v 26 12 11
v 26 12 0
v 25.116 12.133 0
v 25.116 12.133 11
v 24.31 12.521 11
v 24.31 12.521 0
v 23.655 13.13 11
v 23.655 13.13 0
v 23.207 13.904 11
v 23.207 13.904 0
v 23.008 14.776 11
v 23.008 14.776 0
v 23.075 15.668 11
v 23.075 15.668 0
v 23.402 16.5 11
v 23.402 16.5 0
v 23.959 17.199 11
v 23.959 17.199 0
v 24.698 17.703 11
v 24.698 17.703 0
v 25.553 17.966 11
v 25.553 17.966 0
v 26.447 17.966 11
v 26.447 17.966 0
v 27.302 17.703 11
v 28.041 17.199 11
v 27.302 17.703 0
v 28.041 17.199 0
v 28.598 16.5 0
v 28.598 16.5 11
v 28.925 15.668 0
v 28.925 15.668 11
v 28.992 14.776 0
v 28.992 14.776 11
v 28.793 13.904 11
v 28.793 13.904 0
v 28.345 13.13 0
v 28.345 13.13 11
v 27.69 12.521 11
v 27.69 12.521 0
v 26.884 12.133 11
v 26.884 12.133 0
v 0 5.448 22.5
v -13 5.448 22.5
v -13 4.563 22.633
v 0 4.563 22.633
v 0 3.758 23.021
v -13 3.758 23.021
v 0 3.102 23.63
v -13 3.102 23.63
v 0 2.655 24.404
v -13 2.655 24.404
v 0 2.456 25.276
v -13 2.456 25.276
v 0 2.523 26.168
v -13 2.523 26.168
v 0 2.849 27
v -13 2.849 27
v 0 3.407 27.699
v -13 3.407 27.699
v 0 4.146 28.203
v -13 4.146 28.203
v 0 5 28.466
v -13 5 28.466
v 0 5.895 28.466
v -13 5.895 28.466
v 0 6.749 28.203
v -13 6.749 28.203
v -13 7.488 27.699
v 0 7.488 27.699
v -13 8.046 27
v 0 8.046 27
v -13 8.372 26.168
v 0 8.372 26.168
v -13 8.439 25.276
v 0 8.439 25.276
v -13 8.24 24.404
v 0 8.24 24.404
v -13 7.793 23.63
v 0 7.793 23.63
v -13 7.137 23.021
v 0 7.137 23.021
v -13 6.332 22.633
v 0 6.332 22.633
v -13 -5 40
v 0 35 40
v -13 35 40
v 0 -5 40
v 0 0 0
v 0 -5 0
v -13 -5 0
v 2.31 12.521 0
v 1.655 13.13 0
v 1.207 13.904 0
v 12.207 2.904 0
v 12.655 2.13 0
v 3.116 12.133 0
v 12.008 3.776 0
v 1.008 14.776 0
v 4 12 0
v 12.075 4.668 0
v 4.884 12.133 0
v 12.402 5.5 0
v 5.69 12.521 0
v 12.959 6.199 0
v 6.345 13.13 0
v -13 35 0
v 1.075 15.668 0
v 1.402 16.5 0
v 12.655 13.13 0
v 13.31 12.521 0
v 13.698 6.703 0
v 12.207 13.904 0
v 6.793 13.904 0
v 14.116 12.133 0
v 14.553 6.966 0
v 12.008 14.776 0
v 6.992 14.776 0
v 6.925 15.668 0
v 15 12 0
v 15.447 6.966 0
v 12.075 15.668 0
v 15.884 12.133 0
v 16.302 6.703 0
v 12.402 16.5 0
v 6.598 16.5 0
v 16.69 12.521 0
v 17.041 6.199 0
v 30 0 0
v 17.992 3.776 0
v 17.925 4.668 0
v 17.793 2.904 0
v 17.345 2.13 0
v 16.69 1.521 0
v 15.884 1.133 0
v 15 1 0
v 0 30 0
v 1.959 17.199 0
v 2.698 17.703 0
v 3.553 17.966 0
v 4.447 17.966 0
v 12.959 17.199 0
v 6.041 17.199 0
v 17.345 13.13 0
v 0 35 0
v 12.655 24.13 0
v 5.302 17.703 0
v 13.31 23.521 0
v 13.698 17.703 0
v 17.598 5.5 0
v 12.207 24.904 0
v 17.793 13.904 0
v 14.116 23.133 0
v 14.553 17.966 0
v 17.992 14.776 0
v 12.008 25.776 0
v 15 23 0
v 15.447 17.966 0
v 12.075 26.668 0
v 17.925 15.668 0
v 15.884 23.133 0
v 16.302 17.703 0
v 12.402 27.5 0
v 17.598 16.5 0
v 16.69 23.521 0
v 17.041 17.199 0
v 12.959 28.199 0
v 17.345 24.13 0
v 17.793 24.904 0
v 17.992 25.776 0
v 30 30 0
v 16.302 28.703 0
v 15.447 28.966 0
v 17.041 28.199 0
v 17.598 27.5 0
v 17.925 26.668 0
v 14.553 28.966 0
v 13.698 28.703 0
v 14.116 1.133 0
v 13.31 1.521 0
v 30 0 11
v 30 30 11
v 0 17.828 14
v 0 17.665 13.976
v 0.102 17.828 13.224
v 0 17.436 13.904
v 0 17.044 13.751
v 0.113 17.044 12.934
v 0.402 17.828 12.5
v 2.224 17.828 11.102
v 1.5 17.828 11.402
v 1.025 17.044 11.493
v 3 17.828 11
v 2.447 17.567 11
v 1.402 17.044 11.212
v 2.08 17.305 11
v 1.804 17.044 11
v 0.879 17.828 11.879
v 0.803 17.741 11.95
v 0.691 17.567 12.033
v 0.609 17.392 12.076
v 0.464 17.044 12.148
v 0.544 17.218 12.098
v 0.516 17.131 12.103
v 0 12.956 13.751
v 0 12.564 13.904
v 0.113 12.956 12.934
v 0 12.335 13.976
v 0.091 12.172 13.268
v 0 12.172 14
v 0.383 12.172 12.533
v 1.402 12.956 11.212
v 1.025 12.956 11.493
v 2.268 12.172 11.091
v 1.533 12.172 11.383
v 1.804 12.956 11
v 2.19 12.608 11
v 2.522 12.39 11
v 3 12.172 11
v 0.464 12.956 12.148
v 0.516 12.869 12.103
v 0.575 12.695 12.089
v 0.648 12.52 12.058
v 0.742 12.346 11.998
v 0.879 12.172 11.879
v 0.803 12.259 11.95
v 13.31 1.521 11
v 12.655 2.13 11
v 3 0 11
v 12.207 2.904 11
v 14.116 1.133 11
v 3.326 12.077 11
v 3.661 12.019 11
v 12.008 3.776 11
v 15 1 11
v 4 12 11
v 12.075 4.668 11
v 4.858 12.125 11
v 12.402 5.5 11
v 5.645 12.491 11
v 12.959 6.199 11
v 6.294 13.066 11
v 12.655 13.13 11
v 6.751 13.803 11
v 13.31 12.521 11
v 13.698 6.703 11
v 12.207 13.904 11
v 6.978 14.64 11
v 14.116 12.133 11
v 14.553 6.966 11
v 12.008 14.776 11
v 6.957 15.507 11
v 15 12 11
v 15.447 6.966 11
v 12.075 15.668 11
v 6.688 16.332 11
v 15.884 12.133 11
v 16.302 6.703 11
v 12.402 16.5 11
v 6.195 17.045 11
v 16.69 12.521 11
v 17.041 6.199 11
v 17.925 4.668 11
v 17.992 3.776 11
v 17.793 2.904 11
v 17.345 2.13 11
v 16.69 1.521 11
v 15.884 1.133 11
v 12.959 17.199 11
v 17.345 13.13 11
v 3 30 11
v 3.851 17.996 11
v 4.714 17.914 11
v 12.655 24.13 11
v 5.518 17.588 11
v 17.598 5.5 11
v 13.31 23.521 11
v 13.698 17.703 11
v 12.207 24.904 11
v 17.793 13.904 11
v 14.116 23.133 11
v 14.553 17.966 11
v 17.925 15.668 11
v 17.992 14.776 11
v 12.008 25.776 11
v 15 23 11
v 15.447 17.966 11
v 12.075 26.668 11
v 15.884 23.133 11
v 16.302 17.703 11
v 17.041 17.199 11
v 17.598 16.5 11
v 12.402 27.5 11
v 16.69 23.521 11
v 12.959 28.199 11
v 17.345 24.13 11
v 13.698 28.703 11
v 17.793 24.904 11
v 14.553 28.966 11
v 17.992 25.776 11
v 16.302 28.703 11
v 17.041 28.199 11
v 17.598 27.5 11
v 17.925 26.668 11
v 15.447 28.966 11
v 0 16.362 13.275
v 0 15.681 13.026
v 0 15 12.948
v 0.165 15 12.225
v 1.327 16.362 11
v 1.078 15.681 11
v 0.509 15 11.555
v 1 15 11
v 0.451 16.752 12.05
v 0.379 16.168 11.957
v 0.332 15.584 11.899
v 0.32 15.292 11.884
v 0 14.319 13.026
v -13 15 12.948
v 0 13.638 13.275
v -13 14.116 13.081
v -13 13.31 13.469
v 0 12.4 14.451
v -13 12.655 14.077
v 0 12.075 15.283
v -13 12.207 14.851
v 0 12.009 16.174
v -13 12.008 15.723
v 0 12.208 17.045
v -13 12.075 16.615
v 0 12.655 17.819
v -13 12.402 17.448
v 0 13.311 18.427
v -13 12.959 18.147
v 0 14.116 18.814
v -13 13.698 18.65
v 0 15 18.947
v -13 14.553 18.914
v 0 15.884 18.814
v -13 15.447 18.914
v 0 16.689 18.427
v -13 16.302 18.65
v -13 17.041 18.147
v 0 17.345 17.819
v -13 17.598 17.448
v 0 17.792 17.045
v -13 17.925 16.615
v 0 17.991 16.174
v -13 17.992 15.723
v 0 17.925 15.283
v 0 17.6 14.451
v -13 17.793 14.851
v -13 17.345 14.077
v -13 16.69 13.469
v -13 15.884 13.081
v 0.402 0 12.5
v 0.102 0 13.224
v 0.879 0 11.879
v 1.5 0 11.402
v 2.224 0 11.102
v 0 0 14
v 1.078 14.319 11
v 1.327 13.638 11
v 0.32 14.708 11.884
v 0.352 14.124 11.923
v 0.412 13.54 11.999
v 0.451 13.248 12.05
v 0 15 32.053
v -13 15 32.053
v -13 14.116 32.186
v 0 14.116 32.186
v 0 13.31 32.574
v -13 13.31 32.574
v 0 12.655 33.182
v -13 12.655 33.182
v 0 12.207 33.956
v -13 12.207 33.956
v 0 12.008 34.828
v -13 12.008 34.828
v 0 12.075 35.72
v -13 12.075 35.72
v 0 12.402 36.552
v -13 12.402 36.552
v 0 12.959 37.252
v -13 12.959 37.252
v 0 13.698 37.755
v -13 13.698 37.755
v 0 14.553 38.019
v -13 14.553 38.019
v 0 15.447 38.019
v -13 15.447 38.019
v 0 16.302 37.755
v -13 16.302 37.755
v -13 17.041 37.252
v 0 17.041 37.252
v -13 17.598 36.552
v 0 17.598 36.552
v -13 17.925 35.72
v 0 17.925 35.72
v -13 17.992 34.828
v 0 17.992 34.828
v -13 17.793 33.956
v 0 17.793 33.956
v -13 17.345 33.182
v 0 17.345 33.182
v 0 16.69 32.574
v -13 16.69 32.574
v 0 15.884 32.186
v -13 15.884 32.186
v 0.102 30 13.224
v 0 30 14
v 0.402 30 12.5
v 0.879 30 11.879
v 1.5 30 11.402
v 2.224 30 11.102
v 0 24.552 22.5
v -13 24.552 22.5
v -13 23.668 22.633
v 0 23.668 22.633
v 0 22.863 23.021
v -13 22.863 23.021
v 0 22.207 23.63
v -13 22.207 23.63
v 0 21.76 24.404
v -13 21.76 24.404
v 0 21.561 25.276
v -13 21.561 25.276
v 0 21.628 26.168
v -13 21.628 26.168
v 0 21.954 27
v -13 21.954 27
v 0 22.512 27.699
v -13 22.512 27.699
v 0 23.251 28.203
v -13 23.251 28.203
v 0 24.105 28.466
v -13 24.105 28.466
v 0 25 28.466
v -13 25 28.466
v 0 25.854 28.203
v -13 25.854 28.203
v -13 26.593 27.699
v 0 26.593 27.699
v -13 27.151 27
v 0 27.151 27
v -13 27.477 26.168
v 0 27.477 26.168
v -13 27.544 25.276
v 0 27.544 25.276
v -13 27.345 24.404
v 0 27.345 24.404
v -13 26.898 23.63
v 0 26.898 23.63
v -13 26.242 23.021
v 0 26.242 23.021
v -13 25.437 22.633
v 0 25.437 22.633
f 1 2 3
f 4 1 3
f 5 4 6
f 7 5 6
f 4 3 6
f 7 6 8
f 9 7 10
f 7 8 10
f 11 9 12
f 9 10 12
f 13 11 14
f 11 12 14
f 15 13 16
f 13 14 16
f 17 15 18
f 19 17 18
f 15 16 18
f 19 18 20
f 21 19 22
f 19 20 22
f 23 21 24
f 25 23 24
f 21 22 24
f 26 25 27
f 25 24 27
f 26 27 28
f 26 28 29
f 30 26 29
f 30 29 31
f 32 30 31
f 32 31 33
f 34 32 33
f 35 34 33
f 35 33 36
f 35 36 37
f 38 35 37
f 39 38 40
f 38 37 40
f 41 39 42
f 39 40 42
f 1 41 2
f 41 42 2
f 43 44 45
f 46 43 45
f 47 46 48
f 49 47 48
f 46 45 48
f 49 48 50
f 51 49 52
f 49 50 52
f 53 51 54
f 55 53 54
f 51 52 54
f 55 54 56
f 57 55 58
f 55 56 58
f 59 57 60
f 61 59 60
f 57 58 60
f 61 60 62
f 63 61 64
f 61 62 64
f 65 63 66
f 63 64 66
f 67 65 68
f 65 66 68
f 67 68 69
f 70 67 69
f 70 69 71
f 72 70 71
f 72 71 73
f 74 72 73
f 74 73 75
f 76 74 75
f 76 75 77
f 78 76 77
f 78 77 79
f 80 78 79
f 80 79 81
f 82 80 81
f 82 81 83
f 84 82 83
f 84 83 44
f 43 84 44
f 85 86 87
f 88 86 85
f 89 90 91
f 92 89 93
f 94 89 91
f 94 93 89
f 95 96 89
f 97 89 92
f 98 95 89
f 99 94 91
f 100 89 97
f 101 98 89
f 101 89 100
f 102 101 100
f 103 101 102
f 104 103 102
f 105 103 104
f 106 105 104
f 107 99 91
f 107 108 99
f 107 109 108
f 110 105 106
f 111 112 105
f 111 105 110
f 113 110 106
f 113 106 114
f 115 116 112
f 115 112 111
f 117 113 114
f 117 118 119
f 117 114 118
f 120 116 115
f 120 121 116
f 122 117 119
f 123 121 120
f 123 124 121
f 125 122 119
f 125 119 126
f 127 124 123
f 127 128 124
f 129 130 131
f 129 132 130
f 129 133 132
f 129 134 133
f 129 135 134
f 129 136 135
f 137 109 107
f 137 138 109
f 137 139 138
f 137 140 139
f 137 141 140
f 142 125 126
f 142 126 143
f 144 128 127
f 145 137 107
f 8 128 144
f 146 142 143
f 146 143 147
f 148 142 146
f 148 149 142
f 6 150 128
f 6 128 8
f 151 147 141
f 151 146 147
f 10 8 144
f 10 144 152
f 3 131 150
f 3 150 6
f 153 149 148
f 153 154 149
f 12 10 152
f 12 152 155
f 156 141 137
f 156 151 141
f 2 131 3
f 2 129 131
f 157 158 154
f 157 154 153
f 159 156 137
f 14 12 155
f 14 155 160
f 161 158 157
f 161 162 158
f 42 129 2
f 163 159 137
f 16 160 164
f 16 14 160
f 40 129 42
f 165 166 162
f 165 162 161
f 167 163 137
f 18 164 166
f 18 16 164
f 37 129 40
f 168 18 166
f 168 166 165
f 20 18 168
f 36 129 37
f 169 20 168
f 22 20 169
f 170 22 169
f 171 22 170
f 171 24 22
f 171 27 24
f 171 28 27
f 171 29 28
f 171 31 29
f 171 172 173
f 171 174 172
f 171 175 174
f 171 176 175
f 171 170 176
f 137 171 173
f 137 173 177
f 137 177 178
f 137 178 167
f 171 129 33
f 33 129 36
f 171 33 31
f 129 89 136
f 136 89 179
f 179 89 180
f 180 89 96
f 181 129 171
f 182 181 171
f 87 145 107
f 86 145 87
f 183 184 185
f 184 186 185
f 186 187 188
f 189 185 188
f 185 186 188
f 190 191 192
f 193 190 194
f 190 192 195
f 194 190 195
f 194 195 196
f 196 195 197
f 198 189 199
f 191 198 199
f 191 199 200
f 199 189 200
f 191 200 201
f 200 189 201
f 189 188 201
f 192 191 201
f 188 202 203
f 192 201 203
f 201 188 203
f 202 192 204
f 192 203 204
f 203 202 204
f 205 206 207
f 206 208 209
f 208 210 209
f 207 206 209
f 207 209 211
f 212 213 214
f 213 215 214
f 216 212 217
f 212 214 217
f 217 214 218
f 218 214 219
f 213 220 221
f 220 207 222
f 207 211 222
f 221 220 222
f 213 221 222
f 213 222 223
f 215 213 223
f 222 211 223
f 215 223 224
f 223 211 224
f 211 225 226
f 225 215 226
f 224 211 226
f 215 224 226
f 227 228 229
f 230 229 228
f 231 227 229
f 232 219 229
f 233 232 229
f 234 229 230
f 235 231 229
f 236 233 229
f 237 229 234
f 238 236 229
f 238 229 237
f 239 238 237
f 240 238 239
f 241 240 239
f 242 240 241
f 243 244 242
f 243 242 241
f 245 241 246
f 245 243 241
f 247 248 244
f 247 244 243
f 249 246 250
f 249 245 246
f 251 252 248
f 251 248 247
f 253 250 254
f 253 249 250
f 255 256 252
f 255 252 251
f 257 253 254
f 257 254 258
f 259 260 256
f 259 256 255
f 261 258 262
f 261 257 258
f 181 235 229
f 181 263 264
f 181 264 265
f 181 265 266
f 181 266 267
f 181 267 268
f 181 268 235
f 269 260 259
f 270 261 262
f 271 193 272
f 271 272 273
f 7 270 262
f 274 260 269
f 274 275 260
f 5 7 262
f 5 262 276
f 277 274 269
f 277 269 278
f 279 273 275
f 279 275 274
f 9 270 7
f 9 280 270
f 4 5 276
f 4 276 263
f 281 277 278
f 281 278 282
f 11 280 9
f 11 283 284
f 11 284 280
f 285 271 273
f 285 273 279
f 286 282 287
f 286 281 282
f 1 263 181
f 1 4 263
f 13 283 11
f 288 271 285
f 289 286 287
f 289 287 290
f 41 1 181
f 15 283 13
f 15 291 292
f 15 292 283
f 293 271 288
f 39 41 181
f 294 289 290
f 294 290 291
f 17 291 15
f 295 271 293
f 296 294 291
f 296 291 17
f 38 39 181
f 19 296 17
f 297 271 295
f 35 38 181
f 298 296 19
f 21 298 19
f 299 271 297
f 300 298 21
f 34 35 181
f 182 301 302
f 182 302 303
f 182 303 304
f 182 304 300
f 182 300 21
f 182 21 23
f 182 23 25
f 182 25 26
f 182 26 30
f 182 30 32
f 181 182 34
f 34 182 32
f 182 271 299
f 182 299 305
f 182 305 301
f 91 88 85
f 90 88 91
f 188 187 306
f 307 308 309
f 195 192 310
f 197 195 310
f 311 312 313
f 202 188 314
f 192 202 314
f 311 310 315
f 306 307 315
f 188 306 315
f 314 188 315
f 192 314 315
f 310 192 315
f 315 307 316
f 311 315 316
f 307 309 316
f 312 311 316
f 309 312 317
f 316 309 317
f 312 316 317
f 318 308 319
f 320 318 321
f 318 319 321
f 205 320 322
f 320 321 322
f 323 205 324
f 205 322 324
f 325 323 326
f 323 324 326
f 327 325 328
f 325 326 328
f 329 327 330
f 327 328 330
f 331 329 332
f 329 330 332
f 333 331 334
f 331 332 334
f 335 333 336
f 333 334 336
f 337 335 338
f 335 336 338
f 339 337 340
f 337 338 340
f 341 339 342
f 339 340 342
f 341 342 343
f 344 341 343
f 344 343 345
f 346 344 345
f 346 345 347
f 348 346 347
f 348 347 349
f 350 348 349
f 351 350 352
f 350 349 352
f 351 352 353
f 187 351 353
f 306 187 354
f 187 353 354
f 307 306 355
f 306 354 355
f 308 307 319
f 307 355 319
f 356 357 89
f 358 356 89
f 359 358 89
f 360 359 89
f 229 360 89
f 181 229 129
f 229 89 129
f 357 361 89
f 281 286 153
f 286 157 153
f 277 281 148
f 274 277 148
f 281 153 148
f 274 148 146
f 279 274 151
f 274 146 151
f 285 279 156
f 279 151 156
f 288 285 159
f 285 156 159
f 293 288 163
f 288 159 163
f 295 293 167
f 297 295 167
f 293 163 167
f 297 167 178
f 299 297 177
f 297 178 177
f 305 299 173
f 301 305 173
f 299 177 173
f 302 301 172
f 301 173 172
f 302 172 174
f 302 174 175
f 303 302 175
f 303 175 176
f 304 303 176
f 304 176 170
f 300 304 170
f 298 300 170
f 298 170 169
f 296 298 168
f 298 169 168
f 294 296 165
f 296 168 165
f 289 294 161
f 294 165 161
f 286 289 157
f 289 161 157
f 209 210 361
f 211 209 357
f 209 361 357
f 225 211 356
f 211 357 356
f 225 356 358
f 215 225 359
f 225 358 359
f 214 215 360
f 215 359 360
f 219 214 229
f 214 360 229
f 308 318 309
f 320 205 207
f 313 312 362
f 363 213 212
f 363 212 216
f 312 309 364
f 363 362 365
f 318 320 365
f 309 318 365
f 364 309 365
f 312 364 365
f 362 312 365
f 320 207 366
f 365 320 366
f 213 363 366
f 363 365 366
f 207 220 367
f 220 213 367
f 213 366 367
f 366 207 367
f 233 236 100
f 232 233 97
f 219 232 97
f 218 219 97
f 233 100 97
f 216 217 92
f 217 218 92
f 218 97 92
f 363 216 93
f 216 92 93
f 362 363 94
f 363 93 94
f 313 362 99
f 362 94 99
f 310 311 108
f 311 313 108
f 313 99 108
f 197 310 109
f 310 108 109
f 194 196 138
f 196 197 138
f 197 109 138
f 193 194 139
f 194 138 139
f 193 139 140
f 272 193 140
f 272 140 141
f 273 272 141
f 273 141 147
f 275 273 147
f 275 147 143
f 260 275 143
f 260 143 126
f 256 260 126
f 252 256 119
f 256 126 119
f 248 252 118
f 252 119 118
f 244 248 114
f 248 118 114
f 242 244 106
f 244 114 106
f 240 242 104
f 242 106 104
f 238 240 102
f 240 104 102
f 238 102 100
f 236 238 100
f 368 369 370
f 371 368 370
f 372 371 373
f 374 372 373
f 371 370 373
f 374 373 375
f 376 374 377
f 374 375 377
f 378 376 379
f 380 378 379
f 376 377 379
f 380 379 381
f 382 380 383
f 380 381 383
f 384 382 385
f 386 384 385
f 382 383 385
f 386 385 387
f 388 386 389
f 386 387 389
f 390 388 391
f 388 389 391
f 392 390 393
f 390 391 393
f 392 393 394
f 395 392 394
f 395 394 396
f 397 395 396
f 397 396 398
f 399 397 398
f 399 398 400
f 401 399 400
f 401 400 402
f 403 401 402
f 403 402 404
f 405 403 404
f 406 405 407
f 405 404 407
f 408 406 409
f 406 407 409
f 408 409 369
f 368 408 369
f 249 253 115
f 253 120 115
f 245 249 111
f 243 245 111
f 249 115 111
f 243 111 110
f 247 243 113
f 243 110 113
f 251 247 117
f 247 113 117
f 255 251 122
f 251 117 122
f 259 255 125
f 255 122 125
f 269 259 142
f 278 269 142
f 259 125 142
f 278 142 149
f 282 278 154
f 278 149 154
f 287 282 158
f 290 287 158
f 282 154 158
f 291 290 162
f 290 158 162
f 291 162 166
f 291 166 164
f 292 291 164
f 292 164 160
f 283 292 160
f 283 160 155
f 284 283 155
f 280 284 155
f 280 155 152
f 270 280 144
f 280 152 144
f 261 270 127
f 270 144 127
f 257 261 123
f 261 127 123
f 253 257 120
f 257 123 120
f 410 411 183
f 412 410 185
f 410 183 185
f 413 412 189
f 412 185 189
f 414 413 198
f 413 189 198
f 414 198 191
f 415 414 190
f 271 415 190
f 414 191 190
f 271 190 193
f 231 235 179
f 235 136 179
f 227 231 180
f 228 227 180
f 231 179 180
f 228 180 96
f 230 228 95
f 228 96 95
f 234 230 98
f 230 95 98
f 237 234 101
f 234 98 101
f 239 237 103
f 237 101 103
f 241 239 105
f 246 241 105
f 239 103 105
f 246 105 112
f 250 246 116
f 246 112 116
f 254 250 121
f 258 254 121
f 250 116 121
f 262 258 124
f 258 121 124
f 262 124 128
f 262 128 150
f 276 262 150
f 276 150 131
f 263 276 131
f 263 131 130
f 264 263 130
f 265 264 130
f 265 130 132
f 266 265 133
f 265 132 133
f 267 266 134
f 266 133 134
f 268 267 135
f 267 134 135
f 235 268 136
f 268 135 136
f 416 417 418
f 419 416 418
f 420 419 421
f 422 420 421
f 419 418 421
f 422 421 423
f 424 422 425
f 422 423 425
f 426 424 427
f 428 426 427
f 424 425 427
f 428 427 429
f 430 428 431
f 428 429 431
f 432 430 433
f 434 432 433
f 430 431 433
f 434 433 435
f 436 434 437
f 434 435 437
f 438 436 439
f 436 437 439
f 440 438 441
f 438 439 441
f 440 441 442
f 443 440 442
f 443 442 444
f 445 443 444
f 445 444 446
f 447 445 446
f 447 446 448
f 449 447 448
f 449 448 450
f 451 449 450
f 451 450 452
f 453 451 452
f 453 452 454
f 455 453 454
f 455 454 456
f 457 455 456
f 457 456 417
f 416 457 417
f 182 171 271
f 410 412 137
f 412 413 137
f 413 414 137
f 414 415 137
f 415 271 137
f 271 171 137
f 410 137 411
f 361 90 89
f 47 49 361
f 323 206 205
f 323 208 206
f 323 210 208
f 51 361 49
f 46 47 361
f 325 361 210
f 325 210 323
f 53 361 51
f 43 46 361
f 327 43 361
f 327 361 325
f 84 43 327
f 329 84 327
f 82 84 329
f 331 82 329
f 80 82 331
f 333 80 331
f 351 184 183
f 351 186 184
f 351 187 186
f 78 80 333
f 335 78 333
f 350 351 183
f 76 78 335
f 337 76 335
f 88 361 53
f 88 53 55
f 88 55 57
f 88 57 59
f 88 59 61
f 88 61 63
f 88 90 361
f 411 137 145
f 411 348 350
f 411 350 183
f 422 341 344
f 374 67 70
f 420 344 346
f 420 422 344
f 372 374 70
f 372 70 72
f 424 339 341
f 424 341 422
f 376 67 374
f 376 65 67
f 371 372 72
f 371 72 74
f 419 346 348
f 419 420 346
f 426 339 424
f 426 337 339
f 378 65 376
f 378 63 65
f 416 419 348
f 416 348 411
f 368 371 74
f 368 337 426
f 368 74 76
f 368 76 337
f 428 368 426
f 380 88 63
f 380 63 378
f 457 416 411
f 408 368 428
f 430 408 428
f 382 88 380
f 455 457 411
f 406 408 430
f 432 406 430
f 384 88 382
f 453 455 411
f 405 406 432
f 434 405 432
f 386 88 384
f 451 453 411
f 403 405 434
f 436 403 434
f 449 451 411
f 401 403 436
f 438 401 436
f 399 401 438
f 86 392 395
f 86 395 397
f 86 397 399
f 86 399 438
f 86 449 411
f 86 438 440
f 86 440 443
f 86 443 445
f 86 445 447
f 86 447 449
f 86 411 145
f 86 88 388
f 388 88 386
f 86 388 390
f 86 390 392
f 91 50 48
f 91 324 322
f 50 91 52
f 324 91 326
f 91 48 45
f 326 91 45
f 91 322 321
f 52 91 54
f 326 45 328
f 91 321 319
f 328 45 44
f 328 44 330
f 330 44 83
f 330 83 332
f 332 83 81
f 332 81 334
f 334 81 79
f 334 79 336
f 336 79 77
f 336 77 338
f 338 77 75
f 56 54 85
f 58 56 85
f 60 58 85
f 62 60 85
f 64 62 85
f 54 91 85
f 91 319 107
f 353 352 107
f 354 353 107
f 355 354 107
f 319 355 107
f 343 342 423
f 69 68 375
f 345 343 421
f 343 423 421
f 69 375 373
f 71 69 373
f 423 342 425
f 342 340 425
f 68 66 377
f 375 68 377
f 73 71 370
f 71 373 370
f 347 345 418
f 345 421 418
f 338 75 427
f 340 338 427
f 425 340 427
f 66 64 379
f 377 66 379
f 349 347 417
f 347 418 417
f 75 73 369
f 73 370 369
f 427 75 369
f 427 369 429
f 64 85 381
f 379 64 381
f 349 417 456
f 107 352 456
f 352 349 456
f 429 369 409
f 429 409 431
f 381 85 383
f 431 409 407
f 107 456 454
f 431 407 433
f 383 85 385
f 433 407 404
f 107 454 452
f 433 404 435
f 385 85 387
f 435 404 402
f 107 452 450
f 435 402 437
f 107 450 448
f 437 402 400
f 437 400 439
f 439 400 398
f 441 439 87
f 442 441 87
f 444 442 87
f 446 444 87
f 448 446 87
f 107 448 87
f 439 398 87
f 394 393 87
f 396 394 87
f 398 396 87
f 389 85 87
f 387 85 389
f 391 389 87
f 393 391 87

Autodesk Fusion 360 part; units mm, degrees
sketch "Sketch1" plane through (0, 0, 0) normal (0, 0, 1) x (1, 0, 0)
  line L0 (0, 0) -> (30, 0)
  line L1 (30, 0) -> (30, 30)
  line L2 (30, 30) -> (0, 30)
  line L3 (0, 30) -> (0, 0)
  dimension "d10" = 30
  dimension "d11" = 30
extrude "Extrude1" add sketch "Sketch1" along normal blind 11
sketch "Sketch2" plane through (0, 0, 0) normal (1, 0, 0) x (0, 1, 0)
  line L0 (-5, 0) -> (35, 0)
  line L1 (35, 0) -> (35, 40)
  line L2 (35, 40) -> (-5, 40)
  line L3 (-5, 40) -> (-5, 0)
  dimension "d14" = 40
  dimension "d15" = 40
extrude "Extrude2" add sketch "Sketch2" against normal blind 13
hole "Hole1" at (15, 15, 11) direction (0, 0, -1) diameter 6 depth 15 tip angle 118
sketch "Sketch3" plane through (0, 0, 11) normal (0, 0, 1) x (-1, 0, 0)
  circle A0 centre (-15, -15) radius 3
  line L0 (0, -30) -> (0, 0)
  line L1 (0, 0) -> (-30, 0)
  line L2 (-30, 0) -> (-30, -30)
  line L3 (-30, -30) -> (0, -30)
  circle A1 centre (-15, -15) radius 11
  circle A2 centre (-4, -15) radius 1 construction
  circle A3 centre (-15, -26) radius 0.8867 construction
  circle A4 centre (-26, -15) radius 1 construction
  circle A5 centre (-15, -4) radius 0.9365 construction
  dimension "d23" = 22
hole "Hole2" at (4, 15, 11) at (15, 26, 11) at (26, 15, 11) at (15, 4, 11) direction (0, 0, -1) diameter 6 end through all
sketch "Sketch4" plane through (0, 0, 0) normal (1, 0, 0) x (0, 1, 0)
  line L0 (30, 11) -> (30, 0)
  line L1 (30, 0) -> (35, 0)
  line L2 (35, 0) -> (35, 40)
  line L3 (35, 40) -> (-5, 40)
  line L4 (-5, 40) -> (-5, 0)
  line L5 (-5, 0) -> (0, 0)
  line L6 (0, 0) -> (0, 11)
  line L7 (0, 11) -> (30, 11)
  line L8 (15, 40) -> (15, 11) construction
  line L9 (15, 25.5) -> (-5, 25.5) construction
  line L10 (15, 25.5) -> (35, 25.5) construction
  circle A0 centre (15, 25.5) radius 9.5525 construction
  circle A1 centre (15, 35.0525) radius 0.9475 construction
  circle A2 centre (24.5525, 25.5) radius 0.7982 construction
  circle A3 centre (15, 15.9475) radius 1.0525 construction
  circle A4 centre (5.4475, 25.5) radius 0.8032 construction
hole "Hole3" at (0, 15, 35.0525) at (0, 24.5525, 25.5) at (0, 15, 15.9475) at (0, 5.4475, 25.5) direction (-1, 0, 0) diameter 6 end through all
fillet "Fillet1" radius 3 1 edges at (0, 15, 11)
ref_plane "WorkPlane1" through (15, 15, 7) normal (0, -1, 0) x (1, 0, 0)
sketch "Sketch5" plane through (0, 15, 0) normal (0, -1, 0) x (-1, 0, 0)
equation "b1 = 30 mm"
equation "h1 = 11 mm"
equation "L1 = 30 mm"
equation "b2 = 40 mm"
equation "h2 = 13 mm"
equation "L2 = 40 mm"
equation "hole_wall = 3.4 mm"
equation "hole_motor = 3.4 mm"
equation "hole_shaft = 6 mm"
equation "d10 = b1"
equation "d11 = L1"
equation "d12 = h1"
equation "d14 = b2"
equation "d15 = L2"
equation "d16 = -h2"
equation "d19 = hole_shaft"
